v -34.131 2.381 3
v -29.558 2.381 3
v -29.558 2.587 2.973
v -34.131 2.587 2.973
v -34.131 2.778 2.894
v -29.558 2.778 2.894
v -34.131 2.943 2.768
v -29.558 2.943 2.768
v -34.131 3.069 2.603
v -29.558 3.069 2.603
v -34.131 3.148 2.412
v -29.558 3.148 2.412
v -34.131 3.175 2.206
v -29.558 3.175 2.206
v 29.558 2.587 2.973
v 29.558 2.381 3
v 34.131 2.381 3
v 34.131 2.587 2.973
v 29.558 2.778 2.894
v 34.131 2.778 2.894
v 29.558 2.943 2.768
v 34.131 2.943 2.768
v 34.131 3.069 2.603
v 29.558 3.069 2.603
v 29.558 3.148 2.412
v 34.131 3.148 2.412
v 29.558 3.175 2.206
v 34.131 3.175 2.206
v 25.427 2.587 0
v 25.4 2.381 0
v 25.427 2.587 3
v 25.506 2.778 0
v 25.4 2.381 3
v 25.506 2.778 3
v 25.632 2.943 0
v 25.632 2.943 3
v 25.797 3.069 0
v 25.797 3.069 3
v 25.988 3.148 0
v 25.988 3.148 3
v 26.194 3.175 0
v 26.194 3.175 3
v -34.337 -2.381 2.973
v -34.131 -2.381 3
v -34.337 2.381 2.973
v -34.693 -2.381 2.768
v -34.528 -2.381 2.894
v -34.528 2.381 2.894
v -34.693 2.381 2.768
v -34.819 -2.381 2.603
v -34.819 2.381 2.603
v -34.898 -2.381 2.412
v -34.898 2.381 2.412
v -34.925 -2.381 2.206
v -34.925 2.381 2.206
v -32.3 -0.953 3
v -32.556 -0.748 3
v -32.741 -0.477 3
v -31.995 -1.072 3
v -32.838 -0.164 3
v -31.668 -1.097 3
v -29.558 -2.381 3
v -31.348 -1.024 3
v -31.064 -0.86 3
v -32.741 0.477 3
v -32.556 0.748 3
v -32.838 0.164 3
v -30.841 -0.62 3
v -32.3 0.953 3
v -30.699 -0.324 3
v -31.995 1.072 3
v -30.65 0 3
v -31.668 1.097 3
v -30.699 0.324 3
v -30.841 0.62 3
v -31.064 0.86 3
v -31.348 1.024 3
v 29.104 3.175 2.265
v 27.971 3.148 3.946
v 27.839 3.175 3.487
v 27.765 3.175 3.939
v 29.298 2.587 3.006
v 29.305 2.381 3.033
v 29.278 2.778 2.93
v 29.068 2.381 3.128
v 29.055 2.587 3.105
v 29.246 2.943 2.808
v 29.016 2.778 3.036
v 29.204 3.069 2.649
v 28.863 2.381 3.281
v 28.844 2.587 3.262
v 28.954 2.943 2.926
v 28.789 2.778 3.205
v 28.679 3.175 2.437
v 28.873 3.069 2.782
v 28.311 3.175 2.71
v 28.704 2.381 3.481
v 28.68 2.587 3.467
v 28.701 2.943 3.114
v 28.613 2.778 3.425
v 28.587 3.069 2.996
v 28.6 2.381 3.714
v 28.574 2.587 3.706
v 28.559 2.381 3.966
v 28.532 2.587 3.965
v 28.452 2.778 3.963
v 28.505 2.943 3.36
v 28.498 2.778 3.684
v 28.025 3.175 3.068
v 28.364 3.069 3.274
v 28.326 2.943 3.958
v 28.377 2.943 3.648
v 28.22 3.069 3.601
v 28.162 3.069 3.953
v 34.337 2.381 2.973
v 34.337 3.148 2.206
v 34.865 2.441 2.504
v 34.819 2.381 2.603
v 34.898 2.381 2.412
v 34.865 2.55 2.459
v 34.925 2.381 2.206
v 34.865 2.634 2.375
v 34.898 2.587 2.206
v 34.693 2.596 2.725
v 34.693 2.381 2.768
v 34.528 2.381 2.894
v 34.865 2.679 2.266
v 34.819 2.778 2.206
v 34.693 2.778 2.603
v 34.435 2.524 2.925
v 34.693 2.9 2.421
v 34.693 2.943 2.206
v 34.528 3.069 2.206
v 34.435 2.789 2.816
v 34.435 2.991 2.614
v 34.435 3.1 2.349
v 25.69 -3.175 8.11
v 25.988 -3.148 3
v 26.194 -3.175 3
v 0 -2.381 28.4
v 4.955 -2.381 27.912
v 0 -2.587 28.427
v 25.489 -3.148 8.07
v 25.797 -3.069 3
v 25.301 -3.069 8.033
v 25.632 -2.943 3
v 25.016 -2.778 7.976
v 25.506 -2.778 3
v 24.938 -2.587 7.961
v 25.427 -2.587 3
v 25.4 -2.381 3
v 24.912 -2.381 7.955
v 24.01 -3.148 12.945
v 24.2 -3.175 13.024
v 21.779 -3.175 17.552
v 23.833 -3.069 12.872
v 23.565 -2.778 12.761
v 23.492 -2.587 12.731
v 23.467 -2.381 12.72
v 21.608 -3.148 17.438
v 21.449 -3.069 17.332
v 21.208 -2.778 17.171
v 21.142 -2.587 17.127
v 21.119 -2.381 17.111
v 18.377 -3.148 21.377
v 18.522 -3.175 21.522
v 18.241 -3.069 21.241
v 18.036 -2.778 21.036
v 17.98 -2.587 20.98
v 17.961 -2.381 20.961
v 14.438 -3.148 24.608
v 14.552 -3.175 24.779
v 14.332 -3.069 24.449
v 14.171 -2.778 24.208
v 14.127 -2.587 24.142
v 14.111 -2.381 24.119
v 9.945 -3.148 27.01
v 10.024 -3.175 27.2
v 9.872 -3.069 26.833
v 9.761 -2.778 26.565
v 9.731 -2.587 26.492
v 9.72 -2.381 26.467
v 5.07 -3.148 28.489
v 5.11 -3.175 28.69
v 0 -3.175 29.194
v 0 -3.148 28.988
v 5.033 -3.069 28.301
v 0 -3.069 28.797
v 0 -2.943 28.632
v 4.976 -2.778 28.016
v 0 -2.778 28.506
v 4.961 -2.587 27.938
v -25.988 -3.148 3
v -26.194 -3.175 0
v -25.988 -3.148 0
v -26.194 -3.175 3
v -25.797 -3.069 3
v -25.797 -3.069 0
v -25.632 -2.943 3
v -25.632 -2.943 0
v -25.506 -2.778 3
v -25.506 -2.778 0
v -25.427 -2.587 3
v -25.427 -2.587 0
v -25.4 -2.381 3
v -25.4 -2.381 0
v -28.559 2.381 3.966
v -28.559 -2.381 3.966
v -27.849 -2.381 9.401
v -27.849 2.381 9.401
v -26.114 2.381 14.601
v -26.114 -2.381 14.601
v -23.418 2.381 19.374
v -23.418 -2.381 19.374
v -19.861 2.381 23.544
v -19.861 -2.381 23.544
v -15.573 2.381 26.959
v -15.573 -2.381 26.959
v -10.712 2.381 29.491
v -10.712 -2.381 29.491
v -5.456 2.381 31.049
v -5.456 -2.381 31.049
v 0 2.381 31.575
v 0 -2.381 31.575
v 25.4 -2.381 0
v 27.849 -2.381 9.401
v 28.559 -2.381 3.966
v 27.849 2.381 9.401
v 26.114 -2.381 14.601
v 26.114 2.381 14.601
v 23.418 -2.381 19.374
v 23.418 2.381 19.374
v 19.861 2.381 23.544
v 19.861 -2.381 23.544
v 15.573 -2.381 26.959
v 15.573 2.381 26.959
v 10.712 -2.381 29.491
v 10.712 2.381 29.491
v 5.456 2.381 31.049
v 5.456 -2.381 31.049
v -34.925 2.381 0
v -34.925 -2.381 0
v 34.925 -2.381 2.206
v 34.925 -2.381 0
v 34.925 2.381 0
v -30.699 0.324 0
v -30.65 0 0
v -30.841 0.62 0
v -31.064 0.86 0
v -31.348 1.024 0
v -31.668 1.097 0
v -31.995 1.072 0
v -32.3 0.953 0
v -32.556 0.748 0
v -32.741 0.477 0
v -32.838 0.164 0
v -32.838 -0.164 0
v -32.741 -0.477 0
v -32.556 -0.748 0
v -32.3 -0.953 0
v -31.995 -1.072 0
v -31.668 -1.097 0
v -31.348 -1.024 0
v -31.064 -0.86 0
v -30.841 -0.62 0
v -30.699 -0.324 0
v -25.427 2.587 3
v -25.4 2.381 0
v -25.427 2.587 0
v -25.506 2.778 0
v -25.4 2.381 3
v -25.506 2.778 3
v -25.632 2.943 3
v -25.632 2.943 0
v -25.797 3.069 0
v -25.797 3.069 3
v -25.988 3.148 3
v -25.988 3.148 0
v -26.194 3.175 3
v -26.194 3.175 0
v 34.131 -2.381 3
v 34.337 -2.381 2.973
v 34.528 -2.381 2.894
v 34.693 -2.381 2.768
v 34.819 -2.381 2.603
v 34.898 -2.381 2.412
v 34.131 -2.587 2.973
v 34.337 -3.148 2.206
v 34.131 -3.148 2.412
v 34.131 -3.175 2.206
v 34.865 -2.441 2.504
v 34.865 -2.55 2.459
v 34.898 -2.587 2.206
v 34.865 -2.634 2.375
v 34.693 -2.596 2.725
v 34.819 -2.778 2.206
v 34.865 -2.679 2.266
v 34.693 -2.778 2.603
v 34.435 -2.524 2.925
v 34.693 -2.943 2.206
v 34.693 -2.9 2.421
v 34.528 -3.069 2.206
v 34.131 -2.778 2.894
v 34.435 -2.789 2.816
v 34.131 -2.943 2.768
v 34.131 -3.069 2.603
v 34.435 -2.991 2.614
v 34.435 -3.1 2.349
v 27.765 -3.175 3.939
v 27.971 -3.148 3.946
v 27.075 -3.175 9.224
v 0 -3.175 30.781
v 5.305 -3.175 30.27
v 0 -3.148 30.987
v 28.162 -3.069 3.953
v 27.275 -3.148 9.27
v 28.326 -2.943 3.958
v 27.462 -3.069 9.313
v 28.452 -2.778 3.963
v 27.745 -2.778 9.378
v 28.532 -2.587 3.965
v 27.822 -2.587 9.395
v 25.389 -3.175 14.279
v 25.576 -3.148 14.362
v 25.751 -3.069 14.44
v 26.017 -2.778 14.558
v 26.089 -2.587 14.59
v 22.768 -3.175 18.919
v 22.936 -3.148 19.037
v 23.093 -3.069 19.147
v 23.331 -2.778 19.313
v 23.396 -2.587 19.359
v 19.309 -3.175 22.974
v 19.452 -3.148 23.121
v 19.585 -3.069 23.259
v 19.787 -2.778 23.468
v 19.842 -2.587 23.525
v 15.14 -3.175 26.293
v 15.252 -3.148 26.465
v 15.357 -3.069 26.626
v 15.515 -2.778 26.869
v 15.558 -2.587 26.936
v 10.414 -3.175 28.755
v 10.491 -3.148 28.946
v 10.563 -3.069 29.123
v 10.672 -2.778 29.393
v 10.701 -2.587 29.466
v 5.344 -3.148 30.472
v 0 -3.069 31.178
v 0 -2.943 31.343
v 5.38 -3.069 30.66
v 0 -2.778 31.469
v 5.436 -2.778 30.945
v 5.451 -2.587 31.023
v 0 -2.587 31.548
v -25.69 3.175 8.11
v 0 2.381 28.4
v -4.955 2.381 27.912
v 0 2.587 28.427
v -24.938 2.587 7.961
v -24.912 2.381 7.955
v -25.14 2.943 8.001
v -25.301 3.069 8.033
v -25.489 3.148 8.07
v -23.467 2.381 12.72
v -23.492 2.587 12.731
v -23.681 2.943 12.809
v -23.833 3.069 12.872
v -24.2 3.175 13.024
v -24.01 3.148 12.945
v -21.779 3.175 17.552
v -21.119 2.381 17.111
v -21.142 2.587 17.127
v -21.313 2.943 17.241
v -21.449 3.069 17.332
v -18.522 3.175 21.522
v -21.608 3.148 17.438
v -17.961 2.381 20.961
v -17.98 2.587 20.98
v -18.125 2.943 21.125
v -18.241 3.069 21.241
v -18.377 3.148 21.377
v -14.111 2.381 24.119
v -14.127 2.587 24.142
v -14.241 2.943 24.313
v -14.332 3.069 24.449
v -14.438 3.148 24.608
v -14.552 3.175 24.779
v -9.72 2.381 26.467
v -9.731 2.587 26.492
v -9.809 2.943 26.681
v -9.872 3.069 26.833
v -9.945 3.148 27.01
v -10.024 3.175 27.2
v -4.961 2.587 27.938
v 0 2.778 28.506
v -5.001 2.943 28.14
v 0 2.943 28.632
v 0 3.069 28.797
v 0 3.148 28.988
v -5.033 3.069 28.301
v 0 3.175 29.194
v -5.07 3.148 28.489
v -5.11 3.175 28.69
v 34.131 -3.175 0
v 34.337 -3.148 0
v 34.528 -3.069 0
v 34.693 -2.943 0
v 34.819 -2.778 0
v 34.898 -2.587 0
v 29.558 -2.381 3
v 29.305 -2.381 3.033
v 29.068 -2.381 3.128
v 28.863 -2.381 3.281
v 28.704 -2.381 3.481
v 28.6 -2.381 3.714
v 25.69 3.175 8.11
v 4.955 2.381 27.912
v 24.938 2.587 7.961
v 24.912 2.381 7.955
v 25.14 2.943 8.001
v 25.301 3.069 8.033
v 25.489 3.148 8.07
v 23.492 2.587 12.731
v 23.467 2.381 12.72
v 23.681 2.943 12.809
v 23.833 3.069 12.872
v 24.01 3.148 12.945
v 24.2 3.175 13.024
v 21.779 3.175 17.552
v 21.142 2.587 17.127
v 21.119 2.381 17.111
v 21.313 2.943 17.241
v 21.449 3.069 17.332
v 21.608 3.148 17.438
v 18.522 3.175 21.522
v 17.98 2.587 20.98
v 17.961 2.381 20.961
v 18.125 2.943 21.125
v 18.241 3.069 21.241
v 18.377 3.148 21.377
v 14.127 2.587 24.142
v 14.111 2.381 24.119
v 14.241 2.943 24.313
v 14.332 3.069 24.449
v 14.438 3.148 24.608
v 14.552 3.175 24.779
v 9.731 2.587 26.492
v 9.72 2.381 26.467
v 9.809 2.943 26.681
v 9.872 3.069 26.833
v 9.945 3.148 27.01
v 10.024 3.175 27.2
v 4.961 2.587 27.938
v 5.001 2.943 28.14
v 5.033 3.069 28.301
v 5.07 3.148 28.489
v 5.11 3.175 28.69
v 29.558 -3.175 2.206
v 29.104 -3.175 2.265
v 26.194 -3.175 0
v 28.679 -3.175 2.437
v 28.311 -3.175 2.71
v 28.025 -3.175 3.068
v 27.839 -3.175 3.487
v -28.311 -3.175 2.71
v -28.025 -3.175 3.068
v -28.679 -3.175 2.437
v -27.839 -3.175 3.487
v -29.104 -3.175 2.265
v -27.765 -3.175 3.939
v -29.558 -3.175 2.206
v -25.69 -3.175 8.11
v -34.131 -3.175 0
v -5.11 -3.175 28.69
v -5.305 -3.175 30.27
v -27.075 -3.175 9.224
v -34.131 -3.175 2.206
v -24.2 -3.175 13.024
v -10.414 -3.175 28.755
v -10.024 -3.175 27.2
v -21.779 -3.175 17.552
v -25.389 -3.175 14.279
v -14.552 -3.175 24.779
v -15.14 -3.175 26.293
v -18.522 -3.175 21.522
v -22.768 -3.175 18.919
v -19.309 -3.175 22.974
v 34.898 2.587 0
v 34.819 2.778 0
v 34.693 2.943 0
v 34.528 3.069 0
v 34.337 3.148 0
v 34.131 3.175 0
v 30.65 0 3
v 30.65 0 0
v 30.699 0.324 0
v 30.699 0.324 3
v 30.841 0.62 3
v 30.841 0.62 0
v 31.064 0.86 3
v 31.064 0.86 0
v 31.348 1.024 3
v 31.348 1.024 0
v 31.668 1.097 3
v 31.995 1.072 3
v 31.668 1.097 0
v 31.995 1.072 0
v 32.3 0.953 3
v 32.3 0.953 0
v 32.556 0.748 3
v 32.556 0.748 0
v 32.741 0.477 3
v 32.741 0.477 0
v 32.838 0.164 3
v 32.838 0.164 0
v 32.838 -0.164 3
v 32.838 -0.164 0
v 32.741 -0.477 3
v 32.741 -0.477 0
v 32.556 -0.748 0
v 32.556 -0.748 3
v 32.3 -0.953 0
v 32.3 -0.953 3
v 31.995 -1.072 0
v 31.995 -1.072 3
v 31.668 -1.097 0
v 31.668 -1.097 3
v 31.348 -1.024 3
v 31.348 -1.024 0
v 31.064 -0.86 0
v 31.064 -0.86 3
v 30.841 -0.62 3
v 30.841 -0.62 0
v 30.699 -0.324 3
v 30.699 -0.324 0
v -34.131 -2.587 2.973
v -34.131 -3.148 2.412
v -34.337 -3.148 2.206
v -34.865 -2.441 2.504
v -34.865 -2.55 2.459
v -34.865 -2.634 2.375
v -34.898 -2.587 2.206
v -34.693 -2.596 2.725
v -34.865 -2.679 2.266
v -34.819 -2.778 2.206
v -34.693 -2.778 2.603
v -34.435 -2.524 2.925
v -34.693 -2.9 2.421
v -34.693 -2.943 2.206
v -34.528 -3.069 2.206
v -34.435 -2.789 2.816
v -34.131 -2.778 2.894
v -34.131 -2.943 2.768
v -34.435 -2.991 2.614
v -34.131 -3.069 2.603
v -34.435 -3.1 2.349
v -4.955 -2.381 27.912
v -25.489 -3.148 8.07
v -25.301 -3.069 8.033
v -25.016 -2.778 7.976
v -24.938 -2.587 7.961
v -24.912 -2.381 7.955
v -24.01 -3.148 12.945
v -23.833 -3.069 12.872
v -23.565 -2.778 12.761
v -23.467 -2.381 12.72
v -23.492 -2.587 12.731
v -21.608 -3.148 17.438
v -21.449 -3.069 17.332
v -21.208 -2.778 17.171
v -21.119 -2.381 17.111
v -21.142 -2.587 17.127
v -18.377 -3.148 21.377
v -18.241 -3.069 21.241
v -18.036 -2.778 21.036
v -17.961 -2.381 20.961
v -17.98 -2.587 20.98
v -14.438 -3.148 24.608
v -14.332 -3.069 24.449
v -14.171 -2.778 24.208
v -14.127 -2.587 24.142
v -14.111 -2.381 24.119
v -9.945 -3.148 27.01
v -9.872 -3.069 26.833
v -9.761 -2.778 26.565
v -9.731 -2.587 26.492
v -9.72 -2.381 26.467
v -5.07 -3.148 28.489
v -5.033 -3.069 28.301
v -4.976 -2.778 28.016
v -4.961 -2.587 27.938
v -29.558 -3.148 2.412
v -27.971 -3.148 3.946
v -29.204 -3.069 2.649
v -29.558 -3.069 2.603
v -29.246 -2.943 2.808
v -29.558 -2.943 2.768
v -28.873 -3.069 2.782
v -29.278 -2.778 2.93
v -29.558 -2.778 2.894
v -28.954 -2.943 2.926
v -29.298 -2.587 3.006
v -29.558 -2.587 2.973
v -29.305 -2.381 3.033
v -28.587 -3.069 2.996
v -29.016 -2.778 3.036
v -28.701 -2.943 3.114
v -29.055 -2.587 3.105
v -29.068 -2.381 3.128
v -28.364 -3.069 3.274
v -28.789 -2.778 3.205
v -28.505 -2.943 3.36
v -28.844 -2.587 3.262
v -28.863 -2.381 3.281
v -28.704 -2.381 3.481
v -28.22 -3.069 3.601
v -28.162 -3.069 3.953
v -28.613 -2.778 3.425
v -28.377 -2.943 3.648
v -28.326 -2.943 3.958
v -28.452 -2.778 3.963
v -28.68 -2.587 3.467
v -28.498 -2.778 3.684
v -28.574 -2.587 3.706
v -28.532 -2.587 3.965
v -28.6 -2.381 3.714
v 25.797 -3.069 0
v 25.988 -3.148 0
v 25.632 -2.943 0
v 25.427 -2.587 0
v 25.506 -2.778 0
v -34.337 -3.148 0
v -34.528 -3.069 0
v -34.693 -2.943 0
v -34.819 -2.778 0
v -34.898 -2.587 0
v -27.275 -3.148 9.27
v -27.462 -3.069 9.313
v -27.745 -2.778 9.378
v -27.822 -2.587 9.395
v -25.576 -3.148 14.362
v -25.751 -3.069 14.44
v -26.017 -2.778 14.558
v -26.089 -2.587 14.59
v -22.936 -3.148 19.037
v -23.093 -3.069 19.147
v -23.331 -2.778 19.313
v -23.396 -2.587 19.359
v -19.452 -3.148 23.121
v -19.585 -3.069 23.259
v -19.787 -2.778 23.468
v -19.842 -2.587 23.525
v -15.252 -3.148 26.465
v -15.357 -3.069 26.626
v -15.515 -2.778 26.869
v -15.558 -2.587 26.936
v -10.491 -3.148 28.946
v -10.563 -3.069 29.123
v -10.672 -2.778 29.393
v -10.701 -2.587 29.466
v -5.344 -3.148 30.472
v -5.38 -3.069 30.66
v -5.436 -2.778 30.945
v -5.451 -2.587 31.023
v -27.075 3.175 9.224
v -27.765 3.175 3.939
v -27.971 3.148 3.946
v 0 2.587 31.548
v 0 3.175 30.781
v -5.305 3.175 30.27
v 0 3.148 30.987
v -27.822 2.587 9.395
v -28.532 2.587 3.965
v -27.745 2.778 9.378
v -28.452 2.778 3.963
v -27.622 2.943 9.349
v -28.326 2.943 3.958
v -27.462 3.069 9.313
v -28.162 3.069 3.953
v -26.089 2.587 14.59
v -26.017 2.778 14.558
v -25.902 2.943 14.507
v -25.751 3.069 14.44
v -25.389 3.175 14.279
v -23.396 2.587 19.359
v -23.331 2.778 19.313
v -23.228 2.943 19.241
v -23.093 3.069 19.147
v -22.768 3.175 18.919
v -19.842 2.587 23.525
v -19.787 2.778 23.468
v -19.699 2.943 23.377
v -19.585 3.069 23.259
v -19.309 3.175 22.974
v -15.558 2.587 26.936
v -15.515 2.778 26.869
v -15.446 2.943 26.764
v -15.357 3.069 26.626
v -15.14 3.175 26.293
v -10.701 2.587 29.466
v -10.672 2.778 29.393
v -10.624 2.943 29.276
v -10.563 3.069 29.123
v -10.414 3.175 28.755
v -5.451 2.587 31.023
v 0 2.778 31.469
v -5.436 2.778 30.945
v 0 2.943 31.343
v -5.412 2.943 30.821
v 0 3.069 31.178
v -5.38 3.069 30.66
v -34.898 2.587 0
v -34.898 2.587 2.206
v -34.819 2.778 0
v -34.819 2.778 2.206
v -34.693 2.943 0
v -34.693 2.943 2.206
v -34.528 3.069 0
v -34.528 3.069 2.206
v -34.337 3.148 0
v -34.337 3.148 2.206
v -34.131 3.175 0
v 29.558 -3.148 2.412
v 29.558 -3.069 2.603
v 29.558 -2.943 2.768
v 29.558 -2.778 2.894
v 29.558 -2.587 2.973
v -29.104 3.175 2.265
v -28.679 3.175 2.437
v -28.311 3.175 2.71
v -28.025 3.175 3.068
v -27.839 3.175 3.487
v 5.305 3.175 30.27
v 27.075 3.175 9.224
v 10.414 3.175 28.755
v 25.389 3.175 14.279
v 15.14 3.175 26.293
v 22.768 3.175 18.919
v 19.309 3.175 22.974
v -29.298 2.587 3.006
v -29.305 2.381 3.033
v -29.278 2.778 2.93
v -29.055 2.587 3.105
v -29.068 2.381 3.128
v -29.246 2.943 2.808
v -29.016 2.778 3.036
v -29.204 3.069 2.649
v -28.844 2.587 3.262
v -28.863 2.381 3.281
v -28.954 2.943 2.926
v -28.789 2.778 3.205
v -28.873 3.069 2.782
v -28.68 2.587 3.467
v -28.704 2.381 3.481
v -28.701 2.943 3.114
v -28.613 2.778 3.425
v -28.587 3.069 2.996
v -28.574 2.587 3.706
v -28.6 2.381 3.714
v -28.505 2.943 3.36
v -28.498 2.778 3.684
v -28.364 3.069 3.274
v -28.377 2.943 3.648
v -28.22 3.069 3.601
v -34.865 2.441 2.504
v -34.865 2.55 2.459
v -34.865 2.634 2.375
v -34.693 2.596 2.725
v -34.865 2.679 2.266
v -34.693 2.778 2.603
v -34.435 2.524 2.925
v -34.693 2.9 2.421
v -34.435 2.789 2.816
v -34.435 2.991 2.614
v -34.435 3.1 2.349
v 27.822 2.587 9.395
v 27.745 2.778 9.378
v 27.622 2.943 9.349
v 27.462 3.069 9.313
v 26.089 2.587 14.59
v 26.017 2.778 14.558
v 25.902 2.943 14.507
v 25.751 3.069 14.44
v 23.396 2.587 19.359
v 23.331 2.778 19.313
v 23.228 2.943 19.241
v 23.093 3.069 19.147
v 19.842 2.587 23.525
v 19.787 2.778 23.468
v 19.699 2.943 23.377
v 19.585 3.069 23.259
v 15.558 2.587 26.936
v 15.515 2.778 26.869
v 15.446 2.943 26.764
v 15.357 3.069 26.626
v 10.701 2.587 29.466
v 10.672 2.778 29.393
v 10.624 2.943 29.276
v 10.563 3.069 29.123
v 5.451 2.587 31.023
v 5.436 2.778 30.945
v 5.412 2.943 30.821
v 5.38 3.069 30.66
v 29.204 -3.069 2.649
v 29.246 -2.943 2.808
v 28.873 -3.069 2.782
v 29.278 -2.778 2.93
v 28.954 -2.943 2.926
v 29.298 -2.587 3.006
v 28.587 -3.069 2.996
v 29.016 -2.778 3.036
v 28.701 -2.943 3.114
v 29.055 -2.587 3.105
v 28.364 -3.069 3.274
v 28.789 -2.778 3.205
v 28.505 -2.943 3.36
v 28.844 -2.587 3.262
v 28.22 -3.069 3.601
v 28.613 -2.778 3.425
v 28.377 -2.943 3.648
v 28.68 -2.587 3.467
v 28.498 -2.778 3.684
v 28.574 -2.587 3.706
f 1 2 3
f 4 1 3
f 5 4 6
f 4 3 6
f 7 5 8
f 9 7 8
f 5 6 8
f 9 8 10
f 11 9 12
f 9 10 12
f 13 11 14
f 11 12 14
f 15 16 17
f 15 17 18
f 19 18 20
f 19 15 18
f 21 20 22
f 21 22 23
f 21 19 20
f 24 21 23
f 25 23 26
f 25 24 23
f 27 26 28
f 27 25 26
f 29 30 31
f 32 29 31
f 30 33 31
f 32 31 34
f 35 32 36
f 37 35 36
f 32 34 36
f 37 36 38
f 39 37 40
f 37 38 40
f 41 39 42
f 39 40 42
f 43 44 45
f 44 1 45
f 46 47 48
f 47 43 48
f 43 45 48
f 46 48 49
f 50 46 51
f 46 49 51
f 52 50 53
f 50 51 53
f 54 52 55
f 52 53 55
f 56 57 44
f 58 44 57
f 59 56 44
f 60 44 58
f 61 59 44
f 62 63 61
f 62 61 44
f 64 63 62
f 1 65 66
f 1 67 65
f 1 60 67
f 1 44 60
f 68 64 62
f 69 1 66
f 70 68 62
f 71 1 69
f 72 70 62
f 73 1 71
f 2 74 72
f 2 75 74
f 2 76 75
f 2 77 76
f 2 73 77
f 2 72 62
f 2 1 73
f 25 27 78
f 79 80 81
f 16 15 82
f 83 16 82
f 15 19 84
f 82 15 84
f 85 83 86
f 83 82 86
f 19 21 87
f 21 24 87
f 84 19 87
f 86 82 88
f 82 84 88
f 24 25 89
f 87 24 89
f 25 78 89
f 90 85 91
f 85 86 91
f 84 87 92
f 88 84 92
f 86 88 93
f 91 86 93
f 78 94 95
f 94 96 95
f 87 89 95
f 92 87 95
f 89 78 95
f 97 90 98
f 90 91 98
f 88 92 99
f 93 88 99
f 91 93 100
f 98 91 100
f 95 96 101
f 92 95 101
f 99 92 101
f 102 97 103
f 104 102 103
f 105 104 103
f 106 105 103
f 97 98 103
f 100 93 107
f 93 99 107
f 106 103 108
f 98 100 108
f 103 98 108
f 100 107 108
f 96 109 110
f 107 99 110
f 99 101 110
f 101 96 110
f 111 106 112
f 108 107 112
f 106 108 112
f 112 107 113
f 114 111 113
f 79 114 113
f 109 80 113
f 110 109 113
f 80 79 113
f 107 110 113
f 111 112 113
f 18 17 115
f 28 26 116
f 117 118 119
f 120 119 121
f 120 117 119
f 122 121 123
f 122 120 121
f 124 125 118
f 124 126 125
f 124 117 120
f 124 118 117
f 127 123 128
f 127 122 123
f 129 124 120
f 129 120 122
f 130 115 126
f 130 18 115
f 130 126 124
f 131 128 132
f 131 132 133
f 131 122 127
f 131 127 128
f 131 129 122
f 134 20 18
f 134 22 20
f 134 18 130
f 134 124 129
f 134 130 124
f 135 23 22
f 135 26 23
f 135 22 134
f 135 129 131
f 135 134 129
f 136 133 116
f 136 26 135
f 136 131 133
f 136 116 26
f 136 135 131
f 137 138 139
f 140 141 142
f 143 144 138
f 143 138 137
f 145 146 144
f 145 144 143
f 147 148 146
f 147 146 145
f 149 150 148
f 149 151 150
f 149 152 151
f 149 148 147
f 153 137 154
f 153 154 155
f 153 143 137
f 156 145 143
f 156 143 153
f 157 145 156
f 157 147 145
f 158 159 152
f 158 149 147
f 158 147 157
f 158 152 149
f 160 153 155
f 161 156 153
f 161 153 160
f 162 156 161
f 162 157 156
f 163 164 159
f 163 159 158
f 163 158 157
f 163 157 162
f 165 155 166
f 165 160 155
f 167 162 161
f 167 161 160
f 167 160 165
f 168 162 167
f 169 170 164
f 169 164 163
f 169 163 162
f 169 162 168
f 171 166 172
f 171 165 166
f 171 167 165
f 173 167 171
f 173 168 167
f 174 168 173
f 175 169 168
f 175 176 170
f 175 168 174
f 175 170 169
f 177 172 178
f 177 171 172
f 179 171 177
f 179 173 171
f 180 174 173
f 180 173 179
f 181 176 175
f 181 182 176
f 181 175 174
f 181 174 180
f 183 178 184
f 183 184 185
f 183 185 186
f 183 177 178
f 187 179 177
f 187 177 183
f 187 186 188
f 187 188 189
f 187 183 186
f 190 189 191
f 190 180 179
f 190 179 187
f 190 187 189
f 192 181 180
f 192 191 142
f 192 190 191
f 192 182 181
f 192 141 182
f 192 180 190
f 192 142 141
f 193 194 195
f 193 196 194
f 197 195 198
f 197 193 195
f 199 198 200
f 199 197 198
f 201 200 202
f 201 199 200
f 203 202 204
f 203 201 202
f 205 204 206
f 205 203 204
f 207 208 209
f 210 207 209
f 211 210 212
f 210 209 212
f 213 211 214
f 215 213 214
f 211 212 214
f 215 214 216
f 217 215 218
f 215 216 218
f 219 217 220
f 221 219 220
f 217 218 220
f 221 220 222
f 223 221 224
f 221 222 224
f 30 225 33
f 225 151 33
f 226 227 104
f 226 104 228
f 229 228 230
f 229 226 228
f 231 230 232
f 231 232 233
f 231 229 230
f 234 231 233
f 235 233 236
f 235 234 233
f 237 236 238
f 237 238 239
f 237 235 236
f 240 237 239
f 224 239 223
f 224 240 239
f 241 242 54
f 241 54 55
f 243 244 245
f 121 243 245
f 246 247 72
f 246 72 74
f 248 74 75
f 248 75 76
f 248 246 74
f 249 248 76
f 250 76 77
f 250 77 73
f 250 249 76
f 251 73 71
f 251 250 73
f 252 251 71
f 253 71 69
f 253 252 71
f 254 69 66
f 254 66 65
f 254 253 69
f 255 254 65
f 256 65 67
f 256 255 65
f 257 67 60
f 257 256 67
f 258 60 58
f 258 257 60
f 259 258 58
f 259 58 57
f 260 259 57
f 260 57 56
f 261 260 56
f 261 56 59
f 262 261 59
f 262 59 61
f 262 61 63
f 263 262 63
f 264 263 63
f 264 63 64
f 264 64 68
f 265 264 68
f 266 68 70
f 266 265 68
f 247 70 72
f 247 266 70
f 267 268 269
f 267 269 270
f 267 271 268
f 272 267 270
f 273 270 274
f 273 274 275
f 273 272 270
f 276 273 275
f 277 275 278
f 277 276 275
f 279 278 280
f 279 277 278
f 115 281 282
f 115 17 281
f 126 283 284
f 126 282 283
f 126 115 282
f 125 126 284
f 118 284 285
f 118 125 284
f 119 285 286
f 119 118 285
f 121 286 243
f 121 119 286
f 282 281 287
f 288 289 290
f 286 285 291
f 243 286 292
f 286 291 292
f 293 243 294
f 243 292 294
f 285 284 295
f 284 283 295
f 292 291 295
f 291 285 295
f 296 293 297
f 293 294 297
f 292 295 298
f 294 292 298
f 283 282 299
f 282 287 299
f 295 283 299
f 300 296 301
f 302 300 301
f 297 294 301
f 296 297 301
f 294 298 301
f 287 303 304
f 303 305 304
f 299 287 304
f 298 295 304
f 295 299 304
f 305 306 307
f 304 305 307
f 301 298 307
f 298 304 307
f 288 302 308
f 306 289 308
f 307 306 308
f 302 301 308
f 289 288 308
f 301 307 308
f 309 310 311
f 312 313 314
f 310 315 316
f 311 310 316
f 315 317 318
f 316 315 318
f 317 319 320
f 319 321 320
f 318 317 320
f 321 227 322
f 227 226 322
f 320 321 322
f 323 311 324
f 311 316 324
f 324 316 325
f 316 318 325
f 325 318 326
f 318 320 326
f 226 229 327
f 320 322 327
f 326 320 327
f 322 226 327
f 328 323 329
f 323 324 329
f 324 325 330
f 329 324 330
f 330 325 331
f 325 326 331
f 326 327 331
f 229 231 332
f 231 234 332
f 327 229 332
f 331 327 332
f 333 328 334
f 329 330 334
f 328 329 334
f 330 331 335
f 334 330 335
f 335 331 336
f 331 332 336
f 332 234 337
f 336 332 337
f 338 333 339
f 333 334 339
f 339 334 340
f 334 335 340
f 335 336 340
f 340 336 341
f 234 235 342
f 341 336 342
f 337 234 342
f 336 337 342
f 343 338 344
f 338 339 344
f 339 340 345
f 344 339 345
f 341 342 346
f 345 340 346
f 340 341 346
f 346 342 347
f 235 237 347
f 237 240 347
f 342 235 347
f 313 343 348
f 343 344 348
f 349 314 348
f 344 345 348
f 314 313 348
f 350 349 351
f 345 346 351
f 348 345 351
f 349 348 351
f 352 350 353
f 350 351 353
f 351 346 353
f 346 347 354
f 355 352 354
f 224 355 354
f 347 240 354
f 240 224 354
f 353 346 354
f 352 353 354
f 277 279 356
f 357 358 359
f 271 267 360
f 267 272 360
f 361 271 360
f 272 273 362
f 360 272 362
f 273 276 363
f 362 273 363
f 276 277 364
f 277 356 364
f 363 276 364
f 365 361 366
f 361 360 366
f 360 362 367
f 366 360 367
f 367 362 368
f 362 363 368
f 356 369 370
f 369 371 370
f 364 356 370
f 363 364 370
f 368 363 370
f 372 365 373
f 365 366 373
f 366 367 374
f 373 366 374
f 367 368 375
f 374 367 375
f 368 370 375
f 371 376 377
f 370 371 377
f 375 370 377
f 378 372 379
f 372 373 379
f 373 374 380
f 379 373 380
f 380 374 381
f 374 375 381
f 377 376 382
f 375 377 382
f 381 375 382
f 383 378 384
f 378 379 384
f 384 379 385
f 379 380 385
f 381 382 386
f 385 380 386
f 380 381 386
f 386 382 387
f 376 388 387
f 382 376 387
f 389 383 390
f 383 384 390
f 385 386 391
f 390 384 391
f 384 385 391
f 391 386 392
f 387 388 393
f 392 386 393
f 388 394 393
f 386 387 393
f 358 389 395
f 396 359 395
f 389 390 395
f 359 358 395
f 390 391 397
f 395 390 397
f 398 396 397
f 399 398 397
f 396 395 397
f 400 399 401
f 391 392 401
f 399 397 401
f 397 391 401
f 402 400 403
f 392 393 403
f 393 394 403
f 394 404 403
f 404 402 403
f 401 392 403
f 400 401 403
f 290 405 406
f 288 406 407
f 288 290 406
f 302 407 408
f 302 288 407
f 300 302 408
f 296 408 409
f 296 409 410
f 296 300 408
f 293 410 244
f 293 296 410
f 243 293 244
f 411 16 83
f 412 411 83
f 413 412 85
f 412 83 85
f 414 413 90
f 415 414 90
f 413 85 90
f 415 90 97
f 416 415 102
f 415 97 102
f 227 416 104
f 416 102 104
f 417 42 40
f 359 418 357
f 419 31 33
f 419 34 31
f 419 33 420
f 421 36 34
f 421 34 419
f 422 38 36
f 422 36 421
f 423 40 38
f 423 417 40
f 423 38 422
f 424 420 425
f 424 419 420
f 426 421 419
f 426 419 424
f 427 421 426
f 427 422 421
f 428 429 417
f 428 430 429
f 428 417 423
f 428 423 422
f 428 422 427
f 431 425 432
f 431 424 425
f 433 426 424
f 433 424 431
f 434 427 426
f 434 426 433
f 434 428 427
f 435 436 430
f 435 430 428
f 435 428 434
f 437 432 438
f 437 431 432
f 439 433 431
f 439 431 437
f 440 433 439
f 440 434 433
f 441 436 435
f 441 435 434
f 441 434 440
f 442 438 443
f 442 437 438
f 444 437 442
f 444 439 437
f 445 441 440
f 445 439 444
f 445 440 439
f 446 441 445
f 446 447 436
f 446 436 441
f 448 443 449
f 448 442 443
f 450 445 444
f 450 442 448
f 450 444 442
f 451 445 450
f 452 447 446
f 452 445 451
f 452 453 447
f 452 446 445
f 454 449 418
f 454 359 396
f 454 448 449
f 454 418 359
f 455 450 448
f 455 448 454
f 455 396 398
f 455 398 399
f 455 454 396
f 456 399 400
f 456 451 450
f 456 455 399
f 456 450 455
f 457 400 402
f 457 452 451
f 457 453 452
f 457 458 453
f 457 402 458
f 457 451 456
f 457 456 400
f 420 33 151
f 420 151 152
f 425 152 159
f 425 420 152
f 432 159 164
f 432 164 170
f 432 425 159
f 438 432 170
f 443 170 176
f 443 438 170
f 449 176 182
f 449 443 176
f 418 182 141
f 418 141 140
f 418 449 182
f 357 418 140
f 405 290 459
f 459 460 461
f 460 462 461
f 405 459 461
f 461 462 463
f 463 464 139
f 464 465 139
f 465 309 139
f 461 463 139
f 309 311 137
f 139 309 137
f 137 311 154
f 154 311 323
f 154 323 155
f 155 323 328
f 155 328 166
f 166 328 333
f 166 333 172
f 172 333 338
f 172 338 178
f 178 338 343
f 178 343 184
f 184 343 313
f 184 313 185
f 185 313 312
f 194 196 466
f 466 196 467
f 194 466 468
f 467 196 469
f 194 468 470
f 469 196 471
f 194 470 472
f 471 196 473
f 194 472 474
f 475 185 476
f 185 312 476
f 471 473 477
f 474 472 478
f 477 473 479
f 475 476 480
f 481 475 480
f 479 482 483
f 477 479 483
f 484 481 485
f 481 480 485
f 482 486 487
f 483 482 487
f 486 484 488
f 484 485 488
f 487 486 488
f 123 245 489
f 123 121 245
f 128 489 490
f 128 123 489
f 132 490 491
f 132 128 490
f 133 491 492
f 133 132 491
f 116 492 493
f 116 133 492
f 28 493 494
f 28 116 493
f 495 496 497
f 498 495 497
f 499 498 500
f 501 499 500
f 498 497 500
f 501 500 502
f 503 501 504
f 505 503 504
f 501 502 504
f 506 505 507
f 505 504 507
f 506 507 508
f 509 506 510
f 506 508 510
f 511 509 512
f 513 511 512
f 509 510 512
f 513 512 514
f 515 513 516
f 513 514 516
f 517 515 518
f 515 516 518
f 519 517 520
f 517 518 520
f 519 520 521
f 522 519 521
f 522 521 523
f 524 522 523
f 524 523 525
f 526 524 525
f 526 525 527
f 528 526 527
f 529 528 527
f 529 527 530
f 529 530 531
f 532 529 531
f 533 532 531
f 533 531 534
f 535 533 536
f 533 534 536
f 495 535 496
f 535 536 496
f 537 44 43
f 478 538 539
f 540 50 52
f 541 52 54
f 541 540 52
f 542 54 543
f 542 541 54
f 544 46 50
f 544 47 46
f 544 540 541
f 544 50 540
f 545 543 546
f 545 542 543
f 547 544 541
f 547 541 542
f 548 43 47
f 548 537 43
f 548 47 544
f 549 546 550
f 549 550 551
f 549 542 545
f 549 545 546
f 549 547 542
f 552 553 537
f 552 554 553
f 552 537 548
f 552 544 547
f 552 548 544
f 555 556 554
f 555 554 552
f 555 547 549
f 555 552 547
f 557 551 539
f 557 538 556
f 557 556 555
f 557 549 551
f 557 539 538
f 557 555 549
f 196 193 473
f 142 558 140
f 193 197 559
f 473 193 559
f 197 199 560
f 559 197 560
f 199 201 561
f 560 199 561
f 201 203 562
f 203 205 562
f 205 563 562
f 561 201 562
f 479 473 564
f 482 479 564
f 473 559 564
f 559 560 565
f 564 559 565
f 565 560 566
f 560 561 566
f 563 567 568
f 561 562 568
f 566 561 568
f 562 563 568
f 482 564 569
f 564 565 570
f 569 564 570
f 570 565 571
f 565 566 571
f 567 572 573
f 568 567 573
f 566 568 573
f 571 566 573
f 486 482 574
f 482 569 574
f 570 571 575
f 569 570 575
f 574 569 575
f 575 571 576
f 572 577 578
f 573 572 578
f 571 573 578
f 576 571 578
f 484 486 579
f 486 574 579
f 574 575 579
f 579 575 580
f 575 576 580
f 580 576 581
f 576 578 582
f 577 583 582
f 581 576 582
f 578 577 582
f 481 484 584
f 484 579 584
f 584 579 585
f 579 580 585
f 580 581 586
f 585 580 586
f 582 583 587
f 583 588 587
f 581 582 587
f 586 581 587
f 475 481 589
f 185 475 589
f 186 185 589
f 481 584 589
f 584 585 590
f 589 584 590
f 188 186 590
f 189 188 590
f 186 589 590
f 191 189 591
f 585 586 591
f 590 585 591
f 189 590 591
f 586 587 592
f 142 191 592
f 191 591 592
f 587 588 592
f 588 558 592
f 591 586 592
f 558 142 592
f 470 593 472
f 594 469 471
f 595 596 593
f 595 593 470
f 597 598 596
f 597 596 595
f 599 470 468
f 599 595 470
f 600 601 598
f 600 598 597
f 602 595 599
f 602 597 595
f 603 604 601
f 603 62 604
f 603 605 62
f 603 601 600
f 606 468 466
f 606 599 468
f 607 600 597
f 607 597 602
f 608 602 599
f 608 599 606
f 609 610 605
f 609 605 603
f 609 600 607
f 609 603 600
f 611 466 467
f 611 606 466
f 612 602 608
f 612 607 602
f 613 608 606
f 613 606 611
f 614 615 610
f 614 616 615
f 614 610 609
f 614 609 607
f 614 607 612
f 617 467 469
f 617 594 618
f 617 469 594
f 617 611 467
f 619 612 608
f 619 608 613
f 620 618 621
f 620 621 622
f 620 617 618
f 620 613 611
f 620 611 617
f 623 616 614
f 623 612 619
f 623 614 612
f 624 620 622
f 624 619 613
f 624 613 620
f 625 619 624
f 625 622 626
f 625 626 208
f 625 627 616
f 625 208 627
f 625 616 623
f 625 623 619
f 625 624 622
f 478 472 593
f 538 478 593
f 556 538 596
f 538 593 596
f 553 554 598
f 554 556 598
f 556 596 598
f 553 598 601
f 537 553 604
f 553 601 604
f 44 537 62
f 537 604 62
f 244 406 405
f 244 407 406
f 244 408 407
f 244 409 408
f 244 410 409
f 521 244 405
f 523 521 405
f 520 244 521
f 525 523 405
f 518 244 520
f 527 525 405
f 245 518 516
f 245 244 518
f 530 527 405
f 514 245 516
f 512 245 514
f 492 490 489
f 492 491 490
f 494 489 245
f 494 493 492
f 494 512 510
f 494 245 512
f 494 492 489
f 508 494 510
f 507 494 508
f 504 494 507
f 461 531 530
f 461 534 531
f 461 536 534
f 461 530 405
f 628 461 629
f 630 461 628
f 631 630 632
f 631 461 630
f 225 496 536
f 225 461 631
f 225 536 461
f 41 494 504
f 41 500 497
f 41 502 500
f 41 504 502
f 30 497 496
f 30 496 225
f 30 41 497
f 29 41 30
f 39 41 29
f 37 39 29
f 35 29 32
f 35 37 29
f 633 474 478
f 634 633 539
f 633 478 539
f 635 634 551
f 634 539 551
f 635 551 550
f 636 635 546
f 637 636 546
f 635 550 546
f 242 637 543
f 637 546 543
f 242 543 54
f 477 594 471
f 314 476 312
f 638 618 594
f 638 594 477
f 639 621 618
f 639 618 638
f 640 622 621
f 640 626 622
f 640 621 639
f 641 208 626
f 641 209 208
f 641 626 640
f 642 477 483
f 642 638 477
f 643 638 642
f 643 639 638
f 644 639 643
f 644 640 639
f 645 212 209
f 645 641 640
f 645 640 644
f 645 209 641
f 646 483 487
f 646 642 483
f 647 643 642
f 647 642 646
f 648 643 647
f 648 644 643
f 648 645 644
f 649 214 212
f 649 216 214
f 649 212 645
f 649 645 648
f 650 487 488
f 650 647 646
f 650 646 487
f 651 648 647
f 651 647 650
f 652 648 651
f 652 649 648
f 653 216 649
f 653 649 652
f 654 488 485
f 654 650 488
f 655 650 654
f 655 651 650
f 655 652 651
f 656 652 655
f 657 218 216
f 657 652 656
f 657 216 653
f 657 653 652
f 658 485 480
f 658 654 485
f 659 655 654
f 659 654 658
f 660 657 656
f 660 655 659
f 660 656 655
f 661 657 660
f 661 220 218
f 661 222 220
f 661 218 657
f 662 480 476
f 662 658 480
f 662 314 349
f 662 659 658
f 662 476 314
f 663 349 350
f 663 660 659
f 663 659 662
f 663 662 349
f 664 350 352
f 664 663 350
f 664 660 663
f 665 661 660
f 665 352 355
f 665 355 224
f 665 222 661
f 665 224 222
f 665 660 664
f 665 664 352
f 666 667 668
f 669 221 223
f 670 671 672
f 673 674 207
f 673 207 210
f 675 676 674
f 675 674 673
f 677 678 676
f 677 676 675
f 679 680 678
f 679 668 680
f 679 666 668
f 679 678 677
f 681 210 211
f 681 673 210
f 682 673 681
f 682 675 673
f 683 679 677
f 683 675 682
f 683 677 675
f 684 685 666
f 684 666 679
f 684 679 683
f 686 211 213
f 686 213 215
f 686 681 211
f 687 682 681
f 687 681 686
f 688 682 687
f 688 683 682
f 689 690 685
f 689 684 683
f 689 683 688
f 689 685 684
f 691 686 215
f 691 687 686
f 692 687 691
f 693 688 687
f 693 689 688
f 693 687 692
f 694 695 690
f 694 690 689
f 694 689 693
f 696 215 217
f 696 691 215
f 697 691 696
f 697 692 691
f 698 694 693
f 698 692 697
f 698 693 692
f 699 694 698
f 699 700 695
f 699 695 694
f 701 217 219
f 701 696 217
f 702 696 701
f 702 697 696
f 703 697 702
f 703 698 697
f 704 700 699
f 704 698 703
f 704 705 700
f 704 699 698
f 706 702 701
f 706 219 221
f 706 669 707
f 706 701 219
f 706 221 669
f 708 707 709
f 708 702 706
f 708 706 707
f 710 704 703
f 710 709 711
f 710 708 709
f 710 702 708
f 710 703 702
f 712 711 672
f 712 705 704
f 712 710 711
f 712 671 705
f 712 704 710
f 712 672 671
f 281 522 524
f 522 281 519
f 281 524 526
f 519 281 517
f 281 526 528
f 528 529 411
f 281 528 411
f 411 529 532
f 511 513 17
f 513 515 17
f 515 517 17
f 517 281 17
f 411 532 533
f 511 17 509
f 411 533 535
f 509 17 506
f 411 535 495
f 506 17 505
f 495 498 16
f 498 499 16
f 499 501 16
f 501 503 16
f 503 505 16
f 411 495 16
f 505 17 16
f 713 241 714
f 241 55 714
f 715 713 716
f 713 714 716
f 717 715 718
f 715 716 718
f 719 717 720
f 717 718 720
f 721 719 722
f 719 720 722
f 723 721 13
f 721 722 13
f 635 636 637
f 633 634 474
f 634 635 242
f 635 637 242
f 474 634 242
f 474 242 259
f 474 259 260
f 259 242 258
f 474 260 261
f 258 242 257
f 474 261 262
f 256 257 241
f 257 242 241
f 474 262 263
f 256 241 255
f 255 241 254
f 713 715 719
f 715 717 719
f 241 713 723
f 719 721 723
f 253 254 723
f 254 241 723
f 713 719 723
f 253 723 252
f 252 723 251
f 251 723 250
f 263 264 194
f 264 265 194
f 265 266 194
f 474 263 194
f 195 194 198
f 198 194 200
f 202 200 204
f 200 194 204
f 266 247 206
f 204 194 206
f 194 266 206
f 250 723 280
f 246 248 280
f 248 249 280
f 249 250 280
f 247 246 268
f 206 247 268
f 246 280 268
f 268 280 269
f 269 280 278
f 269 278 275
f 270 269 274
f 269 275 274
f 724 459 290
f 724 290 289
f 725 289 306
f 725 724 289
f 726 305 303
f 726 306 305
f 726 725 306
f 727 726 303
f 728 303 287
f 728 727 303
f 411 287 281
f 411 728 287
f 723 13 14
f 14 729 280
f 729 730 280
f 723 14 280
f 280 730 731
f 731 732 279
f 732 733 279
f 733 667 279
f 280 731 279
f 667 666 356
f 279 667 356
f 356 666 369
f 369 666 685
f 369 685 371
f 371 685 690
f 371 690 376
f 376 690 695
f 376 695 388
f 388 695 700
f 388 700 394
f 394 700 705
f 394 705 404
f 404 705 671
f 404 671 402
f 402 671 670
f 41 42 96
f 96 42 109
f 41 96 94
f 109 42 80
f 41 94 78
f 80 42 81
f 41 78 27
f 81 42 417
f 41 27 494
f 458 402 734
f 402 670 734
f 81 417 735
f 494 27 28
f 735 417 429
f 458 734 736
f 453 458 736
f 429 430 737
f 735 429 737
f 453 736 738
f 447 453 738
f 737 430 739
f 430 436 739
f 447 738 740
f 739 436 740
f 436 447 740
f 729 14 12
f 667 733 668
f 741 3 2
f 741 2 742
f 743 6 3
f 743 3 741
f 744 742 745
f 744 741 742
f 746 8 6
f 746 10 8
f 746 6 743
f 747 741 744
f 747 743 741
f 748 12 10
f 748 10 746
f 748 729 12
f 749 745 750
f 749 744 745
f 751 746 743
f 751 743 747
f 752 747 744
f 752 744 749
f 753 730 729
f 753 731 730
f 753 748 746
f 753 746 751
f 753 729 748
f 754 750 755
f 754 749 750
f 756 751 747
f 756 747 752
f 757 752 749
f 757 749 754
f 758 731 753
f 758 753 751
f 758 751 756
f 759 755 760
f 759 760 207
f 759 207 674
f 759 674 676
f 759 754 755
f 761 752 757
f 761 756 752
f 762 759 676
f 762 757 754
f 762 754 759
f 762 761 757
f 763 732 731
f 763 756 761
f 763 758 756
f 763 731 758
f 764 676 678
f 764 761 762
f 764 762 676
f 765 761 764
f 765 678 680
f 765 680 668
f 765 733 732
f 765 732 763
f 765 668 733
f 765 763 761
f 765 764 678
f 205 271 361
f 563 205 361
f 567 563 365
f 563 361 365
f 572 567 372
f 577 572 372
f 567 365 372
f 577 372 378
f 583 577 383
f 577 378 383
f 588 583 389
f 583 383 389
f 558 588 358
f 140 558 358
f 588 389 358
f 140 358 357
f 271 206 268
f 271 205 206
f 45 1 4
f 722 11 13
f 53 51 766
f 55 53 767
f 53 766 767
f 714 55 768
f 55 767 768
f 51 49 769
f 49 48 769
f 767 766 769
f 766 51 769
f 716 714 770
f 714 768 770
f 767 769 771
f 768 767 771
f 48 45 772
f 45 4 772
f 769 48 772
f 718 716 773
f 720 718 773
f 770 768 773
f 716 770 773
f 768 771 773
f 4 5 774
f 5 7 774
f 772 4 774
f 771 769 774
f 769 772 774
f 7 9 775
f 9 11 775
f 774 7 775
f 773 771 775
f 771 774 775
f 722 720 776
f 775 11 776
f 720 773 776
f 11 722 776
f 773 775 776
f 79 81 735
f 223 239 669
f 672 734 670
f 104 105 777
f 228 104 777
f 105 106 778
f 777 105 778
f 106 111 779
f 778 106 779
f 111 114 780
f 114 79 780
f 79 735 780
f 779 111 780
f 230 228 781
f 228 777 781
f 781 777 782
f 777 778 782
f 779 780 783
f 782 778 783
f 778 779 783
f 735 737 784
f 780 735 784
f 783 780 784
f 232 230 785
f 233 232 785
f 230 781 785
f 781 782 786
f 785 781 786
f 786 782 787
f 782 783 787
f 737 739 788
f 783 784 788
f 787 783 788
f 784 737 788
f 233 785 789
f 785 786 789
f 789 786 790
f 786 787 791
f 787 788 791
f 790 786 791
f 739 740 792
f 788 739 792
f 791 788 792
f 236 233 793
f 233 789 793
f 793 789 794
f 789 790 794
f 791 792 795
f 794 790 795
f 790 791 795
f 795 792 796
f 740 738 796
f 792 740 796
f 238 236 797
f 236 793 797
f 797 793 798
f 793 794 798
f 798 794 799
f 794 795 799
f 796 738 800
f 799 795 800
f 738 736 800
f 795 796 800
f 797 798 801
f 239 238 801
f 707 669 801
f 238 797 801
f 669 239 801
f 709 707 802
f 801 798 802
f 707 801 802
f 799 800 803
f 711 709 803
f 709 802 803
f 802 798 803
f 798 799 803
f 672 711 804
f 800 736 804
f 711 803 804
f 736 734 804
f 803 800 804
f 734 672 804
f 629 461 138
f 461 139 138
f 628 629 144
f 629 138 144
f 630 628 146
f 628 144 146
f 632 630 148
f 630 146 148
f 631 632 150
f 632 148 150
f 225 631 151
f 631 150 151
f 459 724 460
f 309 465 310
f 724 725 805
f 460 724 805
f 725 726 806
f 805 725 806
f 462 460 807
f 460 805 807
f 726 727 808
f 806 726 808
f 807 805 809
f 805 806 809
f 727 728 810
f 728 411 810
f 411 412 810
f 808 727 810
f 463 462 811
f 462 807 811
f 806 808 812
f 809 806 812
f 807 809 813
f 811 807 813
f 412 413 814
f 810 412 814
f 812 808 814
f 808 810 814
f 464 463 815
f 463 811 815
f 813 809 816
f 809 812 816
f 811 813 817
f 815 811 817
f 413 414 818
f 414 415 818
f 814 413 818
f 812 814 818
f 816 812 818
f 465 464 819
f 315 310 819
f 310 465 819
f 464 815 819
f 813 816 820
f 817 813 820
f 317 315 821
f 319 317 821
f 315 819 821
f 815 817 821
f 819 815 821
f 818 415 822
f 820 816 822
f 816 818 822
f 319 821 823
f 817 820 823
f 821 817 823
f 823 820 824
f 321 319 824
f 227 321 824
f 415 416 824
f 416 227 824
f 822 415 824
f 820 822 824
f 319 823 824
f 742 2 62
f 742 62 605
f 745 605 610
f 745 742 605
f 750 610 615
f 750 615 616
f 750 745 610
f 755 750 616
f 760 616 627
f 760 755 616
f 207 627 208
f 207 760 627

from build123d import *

# Parameters (mm, degrees)
SKETCH2_W           = 6.35
SKETCH2_H           = 6.35
SKETCH2_R           = 1.1
BOSS_EXTRUDE1_DEPTH = 3
SKETCH4_W           = 3.175
SKETCH4_H           = 6.35
FILLET1_R           = 1
FILLET3_R           = 0.79375


with BuildPart() as part:
    # Sketch2 → Boss-Extrude1 (new body)
    with BuildSketch(Plane.XY):
        with Locations((-31.75, 0)):
            Rectangle(SKETCH2_W, SKETCH2_H)
        with Locations((-31.75, 0)):
            Circle(SKETCH2_R, mode=Mode.SUBTRACT)
    extrude(amount=BOSS_EXTRUDE1_DEPTH)

    # Sweep1: sweep along a path in Sketch3
    with BuildLine(Plane(origin=(0, 0, 0), x_dir=(1, 0, 0), z_dir=(0, 1, 0))) as sweep1_path:
        Line((-28.575, 0), (-28.575, -3))
        ThreePointArc((-28.575, -3), (-20.205576272, -23.205576272), (0, -31.575))
    # Sketch4 → Sweep1 (sweep)
    with BuildSketch(Plane.XY):
        with Locations((-26.9875, 0)):
            Rectangle(SKETCH4_W, SKETCH4_H)
    sweep(path=sweep1_path.line)

    # Fillet1
    fillet1_edges = [part.edges().sort_by_distance(p)[0] for p in [
        (-28.575, 0, 3),
    ]]
    fillet(fillet1_edges, radius=FILLET1_R)

    # Fillet3
    fillet3_edges = [part.edges().sort_by_distance(p)[0] for p in [
        (-25.4, 3.175, 1.5),
        (-25.4, -3.175, 1.5),
        (-17.960512242, 3.175, 20.960512242),
        (-17.960512242, -3.175, 20.960512242),
        (-19.861039911, -3.175, 23.54433544),
        (-28.863039479, -3.175, 3.28103813),
        (-19.861039911, 3.175, 23.54433544),
        (-28.863039479, 3.175, 3.28103813),
        (-32.241544497, -3.175, 3),
        (-34.925, 0, 3),
        (-34.925, 3.175, 1.5),
        (-34.925, -3.175, 1.5),
        (-32.241544497, 3.175, 3),
    ]]
    fillet(fillet3_edges, radius=FILLET3_R)

    # Mirror1: part across plane


with BuildPart() as part_1:
    add(part.part)
    add(part.part.mirror(Plane(origin=(0, 0, 3), x_dir=(0, 0, 1), z_dir=(1, 0, 0))))


solid = part_1.part
